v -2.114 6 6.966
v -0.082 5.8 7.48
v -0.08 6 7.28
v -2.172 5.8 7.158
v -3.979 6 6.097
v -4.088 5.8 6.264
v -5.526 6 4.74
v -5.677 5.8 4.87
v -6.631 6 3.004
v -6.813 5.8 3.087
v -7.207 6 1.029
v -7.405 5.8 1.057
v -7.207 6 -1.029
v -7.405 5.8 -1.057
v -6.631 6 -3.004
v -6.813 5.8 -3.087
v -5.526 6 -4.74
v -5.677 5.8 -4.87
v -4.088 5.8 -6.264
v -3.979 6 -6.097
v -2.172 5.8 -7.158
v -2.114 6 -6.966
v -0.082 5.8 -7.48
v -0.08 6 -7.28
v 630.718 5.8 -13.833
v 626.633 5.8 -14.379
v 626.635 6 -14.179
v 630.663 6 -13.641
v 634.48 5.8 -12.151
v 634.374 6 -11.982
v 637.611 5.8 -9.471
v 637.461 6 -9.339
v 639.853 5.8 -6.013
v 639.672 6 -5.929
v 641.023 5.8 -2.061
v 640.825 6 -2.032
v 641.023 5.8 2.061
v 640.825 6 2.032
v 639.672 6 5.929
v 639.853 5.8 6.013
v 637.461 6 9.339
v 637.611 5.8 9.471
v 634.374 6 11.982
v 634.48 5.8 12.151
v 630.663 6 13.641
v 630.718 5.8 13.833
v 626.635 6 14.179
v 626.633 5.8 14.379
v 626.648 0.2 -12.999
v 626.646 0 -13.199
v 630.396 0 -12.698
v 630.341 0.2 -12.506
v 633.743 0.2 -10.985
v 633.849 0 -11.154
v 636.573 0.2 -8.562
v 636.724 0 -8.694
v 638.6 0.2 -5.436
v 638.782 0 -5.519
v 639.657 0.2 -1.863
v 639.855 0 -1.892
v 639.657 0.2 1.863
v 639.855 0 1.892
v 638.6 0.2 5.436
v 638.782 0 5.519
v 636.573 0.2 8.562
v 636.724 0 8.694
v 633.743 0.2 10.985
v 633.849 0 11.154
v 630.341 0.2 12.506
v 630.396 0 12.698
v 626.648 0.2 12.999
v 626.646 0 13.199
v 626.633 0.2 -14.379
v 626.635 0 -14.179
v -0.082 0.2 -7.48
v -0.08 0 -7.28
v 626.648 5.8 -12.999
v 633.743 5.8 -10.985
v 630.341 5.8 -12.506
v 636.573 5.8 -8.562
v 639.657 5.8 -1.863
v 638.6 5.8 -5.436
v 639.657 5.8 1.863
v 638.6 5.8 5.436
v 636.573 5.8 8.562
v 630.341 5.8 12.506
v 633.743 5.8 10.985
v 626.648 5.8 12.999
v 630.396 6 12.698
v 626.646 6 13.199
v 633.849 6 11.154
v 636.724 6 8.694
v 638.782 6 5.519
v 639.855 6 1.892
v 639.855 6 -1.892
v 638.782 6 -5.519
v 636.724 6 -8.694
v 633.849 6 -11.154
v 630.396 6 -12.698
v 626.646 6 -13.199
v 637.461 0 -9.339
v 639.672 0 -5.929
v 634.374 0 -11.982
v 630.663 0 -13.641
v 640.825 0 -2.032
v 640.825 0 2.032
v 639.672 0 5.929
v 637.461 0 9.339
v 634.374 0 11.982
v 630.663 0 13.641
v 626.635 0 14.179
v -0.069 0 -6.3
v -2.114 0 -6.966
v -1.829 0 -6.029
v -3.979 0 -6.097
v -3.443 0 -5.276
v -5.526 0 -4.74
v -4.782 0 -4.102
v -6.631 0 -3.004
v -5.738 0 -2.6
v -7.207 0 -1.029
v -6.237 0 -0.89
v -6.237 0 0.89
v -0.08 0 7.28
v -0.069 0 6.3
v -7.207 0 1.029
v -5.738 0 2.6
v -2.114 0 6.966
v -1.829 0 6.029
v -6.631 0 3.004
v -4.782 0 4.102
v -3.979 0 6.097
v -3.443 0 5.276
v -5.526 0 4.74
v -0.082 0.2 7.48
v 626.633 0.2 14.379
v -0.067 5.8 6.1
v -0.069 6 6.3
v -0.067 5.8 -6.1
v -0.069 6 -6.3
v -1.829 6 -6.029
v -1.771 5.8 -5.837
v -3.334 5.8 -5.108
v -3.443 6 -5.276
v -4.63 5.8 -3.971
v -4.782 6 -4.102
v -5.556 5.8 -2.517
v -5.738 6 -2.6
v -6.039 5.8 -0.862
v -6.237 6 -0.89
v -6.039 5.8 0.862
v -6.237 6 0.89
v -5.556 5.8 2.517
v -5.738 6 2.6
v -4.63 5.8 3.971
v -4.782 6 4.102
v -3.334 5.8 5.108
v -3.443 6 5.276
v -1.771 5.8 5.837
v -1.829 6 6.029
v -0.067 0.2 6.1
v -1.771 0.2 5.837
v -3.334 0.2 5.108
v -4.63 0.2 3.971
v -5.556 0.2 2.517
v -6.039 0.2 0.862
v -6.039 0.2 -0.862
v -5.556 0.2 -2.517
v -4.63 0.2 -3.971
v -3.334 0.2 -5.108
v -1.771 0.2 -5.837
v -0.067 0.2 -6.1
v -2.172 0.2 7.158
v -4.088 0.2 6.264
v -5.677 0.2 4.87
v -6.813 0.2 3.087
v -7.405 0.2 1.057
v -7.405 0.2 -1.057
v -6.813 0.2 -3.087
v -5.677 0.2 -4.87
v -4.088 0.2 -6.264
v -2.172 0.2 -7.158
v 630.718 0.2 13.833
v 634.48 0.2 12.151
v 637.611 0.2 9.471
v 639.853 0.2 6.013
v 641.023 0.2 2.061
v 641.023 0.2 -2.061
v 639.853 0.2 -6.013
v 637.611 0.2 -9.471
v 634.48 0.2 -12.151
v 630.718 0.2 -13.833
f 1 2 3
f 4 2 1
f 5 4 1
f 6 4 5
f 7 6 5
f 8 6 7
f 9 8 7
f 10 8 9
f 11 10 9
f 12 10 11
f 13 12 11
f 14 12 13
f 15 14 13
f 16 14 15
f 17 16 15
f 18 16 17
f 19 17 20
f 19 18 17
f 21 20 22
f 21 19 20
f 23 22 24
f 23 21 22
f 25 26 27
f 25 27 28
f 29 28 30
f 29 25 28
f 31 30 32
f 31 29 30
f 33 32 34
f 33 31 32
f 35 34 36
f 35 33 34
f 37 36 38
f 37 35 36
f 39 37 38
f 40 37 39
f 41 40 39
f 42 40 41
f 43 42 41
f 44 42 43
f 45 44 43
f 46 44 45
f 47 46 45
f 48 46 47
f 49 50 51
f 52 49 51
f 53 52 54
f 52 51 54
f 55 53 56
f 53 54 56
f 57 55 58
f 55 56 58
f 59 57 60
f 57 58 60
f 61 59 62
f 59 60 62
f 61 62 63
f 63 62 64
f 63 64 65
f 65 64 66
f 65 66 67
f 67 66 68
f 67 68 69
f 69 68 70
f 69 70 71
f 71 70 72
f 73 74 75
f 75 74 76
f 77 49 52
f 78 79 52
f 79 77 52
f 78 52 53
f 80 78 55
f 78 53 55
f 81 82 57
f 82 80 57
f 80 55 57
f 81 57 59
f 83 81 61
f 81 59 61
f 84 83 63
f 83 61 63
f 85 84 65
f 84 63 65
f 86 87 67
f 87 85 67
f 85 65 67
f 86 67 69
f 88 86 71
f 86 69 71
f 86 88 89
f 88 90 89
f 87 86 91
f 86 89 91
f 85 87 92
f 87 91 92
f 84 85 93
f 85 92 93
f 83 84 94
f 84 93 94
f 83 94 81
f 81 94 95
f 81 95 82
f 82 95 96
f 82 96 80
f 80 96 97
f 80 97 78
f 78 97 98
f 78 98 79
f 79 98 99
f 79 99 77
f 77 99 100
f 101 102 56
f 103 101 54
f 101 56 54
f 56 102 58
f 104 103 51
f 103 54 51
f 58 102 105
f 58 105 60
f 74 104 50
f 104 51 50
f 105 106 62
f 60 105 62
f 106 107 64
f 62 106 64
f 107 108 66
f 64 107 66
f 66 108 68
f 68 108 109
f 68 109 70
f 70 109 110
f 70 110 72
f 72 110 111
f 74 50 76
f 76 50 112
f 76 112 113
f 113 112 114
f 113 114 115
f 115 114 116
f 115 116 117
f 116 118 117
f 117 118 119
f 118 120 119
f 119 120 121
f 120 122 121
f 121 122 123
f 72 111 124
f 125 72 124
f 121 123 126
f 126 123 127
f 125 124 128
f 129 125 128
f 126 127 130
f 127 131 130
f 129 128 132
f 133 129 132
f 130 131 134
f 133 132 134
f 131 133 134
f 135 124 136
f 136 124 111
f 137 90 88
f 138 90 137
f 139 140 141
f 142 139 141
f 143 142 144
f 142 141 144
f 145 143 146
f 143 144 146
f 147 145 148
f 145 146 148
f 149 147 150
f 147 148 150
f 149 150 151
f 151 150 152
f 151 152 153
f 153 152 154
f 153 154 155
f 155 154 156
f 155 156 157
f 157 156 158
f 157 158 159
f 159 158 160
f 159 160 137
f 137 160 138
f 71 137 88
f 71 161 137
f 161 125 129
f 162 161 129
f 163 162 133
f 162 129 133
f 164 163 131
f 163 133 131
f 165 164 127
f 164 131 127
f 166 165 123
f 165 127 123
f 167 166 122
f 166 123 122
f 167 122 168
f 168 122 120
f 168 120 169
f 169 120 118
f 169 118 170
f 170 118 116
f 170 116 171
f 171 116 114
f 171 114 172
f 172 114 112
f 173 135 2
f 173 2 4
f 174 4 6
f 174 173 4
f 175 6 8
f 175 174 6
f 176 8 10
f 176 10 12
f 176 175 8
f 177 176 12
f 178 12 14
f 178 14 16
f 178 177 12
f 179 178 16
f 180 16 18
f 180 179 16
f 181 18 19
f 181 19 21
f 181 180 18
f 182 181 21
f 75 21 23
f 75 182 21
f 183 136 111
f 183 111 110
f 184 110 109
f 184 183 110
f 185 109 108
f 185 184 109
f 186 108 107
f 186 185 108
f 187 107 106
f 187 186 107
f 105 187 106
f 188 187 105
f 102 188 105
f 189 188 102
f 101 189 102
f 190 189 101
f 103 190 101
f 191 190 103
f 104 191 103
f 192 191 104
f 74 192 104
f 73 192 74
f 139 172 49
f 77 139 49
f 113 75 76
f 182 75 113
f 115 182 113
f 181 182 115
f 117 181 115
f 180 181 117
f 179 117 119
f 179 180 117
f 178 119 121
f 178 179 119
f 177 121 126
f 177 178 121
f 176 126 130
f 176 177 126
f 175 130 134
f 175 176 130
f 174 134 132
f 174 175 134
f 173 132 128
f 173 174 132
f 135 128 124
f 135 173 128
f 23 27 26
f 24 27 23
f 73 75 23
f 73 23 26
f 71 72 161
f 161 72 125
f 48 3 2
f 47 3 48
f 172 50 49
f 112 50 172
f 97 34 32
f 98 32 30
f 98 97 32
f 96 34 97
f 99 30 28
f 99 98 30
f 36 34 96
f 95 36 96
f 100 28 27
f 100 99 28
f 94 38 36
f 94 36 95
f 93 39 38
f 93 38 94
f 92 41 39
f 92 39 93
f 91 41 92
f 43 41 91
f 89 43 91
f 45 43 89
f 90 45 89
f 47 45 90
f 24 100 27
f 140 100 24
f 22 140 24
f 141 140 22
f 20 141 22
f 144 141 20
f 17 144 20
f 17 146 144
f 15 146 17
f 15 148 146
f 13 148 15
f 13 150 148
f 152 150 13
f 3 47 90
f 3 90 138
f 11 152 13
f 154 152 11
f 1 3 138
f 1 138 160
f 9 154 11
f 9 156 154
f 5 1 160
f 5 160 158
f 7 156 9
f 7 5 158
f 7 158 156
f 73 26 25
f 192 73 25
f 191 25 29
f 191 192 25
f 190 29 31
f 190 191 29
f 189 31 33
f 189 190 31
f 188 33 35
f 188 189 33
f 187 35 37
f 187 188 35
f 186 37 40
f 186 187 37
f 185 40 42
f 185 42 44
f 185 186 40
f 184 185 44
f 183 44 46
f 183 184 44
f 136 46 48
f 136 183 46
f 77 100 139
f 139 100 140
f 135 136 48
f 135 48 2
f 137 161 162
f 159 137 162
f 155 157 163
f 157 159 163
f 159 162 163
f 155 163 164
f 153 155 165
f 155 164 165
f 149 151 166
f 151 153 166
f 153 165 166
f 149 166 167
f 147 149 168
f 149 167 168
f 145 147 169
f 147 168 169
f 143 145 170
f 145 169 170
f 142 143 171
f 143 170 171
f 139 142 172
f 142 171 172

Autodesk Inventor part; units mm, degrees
ref_plane "YZ Plane" through (0, 0, 0) normal (1, 0, 0) x (0, 1, 0)
ref_plane "XZ Plane" through (0, 0, 0) normal (0, 1, 0) x (-1, 0, 0)
ref_plane "XY Plane" through (0, 0, 0) normal (0, 0, 1) x (1, 0, 0)
sketch "Sketch1" plane through (0, 0, 0) normal (0, 1, 0) x (-1, 0, 0)
  line L0 (0.0672, -6.0996) -> (-626.6479, -12.9992)
  line L1 (0.0672, 6.0996) -> (-626.6479, 12.9992)
  arc A0 (0.0672, -6.0996) -> (0.0672, 6.0996) centre (0, 0) ccw
  arc A1 (-626.6479, 12.9992) -> (-626.6479, -12.9992) centre (-626.791, 0) ccw
  line L2 (-626.6327, 14.3791) -> (0.0823, 7.4795)
  arc A2 (0.0823, -7.4795) -> (0.0823, 7.4795) centre (0, 0) ccw
  line L3 (0.0823, -7.4795) -> (-626.6327, -14.3791)
  arc A3 (-626.6327, 14.3791) -> (-626.6327, -14.3791) centre (-626.791, 0) ccw
  dimension "d2" = 6.1
  dimension "d3" = 13
  dimension "d4" = 1.38
  dimension "d5" = 626.791
extrude "Extrusion1" add sketch "Sketch1" along normal blind 6
chamfer "Chamfer1" distance 0.2 angle 45 16 edges at (313.2904, 6, 9.5494) (-6.1, 6, 0) (313.2904, 6, -9.5494) (639.791, 6, 0) (313.2752, 6, 10.9293) (641.171, 6, 0) (313.2752, 6, -10.9293) (-7.48, 6, 0) (313.2752, 0, 10.9293) (-7.48, 0, 0) (313.2752, 0, -10.9293) (641.171, 0, 0) (313.2904, 0, 9.5494) (639.791, 0, 0) (313.2904, 0, -9.5494) (-6.1, 0, 0)
properties part number "x_axis_belt" material "Rubber"
